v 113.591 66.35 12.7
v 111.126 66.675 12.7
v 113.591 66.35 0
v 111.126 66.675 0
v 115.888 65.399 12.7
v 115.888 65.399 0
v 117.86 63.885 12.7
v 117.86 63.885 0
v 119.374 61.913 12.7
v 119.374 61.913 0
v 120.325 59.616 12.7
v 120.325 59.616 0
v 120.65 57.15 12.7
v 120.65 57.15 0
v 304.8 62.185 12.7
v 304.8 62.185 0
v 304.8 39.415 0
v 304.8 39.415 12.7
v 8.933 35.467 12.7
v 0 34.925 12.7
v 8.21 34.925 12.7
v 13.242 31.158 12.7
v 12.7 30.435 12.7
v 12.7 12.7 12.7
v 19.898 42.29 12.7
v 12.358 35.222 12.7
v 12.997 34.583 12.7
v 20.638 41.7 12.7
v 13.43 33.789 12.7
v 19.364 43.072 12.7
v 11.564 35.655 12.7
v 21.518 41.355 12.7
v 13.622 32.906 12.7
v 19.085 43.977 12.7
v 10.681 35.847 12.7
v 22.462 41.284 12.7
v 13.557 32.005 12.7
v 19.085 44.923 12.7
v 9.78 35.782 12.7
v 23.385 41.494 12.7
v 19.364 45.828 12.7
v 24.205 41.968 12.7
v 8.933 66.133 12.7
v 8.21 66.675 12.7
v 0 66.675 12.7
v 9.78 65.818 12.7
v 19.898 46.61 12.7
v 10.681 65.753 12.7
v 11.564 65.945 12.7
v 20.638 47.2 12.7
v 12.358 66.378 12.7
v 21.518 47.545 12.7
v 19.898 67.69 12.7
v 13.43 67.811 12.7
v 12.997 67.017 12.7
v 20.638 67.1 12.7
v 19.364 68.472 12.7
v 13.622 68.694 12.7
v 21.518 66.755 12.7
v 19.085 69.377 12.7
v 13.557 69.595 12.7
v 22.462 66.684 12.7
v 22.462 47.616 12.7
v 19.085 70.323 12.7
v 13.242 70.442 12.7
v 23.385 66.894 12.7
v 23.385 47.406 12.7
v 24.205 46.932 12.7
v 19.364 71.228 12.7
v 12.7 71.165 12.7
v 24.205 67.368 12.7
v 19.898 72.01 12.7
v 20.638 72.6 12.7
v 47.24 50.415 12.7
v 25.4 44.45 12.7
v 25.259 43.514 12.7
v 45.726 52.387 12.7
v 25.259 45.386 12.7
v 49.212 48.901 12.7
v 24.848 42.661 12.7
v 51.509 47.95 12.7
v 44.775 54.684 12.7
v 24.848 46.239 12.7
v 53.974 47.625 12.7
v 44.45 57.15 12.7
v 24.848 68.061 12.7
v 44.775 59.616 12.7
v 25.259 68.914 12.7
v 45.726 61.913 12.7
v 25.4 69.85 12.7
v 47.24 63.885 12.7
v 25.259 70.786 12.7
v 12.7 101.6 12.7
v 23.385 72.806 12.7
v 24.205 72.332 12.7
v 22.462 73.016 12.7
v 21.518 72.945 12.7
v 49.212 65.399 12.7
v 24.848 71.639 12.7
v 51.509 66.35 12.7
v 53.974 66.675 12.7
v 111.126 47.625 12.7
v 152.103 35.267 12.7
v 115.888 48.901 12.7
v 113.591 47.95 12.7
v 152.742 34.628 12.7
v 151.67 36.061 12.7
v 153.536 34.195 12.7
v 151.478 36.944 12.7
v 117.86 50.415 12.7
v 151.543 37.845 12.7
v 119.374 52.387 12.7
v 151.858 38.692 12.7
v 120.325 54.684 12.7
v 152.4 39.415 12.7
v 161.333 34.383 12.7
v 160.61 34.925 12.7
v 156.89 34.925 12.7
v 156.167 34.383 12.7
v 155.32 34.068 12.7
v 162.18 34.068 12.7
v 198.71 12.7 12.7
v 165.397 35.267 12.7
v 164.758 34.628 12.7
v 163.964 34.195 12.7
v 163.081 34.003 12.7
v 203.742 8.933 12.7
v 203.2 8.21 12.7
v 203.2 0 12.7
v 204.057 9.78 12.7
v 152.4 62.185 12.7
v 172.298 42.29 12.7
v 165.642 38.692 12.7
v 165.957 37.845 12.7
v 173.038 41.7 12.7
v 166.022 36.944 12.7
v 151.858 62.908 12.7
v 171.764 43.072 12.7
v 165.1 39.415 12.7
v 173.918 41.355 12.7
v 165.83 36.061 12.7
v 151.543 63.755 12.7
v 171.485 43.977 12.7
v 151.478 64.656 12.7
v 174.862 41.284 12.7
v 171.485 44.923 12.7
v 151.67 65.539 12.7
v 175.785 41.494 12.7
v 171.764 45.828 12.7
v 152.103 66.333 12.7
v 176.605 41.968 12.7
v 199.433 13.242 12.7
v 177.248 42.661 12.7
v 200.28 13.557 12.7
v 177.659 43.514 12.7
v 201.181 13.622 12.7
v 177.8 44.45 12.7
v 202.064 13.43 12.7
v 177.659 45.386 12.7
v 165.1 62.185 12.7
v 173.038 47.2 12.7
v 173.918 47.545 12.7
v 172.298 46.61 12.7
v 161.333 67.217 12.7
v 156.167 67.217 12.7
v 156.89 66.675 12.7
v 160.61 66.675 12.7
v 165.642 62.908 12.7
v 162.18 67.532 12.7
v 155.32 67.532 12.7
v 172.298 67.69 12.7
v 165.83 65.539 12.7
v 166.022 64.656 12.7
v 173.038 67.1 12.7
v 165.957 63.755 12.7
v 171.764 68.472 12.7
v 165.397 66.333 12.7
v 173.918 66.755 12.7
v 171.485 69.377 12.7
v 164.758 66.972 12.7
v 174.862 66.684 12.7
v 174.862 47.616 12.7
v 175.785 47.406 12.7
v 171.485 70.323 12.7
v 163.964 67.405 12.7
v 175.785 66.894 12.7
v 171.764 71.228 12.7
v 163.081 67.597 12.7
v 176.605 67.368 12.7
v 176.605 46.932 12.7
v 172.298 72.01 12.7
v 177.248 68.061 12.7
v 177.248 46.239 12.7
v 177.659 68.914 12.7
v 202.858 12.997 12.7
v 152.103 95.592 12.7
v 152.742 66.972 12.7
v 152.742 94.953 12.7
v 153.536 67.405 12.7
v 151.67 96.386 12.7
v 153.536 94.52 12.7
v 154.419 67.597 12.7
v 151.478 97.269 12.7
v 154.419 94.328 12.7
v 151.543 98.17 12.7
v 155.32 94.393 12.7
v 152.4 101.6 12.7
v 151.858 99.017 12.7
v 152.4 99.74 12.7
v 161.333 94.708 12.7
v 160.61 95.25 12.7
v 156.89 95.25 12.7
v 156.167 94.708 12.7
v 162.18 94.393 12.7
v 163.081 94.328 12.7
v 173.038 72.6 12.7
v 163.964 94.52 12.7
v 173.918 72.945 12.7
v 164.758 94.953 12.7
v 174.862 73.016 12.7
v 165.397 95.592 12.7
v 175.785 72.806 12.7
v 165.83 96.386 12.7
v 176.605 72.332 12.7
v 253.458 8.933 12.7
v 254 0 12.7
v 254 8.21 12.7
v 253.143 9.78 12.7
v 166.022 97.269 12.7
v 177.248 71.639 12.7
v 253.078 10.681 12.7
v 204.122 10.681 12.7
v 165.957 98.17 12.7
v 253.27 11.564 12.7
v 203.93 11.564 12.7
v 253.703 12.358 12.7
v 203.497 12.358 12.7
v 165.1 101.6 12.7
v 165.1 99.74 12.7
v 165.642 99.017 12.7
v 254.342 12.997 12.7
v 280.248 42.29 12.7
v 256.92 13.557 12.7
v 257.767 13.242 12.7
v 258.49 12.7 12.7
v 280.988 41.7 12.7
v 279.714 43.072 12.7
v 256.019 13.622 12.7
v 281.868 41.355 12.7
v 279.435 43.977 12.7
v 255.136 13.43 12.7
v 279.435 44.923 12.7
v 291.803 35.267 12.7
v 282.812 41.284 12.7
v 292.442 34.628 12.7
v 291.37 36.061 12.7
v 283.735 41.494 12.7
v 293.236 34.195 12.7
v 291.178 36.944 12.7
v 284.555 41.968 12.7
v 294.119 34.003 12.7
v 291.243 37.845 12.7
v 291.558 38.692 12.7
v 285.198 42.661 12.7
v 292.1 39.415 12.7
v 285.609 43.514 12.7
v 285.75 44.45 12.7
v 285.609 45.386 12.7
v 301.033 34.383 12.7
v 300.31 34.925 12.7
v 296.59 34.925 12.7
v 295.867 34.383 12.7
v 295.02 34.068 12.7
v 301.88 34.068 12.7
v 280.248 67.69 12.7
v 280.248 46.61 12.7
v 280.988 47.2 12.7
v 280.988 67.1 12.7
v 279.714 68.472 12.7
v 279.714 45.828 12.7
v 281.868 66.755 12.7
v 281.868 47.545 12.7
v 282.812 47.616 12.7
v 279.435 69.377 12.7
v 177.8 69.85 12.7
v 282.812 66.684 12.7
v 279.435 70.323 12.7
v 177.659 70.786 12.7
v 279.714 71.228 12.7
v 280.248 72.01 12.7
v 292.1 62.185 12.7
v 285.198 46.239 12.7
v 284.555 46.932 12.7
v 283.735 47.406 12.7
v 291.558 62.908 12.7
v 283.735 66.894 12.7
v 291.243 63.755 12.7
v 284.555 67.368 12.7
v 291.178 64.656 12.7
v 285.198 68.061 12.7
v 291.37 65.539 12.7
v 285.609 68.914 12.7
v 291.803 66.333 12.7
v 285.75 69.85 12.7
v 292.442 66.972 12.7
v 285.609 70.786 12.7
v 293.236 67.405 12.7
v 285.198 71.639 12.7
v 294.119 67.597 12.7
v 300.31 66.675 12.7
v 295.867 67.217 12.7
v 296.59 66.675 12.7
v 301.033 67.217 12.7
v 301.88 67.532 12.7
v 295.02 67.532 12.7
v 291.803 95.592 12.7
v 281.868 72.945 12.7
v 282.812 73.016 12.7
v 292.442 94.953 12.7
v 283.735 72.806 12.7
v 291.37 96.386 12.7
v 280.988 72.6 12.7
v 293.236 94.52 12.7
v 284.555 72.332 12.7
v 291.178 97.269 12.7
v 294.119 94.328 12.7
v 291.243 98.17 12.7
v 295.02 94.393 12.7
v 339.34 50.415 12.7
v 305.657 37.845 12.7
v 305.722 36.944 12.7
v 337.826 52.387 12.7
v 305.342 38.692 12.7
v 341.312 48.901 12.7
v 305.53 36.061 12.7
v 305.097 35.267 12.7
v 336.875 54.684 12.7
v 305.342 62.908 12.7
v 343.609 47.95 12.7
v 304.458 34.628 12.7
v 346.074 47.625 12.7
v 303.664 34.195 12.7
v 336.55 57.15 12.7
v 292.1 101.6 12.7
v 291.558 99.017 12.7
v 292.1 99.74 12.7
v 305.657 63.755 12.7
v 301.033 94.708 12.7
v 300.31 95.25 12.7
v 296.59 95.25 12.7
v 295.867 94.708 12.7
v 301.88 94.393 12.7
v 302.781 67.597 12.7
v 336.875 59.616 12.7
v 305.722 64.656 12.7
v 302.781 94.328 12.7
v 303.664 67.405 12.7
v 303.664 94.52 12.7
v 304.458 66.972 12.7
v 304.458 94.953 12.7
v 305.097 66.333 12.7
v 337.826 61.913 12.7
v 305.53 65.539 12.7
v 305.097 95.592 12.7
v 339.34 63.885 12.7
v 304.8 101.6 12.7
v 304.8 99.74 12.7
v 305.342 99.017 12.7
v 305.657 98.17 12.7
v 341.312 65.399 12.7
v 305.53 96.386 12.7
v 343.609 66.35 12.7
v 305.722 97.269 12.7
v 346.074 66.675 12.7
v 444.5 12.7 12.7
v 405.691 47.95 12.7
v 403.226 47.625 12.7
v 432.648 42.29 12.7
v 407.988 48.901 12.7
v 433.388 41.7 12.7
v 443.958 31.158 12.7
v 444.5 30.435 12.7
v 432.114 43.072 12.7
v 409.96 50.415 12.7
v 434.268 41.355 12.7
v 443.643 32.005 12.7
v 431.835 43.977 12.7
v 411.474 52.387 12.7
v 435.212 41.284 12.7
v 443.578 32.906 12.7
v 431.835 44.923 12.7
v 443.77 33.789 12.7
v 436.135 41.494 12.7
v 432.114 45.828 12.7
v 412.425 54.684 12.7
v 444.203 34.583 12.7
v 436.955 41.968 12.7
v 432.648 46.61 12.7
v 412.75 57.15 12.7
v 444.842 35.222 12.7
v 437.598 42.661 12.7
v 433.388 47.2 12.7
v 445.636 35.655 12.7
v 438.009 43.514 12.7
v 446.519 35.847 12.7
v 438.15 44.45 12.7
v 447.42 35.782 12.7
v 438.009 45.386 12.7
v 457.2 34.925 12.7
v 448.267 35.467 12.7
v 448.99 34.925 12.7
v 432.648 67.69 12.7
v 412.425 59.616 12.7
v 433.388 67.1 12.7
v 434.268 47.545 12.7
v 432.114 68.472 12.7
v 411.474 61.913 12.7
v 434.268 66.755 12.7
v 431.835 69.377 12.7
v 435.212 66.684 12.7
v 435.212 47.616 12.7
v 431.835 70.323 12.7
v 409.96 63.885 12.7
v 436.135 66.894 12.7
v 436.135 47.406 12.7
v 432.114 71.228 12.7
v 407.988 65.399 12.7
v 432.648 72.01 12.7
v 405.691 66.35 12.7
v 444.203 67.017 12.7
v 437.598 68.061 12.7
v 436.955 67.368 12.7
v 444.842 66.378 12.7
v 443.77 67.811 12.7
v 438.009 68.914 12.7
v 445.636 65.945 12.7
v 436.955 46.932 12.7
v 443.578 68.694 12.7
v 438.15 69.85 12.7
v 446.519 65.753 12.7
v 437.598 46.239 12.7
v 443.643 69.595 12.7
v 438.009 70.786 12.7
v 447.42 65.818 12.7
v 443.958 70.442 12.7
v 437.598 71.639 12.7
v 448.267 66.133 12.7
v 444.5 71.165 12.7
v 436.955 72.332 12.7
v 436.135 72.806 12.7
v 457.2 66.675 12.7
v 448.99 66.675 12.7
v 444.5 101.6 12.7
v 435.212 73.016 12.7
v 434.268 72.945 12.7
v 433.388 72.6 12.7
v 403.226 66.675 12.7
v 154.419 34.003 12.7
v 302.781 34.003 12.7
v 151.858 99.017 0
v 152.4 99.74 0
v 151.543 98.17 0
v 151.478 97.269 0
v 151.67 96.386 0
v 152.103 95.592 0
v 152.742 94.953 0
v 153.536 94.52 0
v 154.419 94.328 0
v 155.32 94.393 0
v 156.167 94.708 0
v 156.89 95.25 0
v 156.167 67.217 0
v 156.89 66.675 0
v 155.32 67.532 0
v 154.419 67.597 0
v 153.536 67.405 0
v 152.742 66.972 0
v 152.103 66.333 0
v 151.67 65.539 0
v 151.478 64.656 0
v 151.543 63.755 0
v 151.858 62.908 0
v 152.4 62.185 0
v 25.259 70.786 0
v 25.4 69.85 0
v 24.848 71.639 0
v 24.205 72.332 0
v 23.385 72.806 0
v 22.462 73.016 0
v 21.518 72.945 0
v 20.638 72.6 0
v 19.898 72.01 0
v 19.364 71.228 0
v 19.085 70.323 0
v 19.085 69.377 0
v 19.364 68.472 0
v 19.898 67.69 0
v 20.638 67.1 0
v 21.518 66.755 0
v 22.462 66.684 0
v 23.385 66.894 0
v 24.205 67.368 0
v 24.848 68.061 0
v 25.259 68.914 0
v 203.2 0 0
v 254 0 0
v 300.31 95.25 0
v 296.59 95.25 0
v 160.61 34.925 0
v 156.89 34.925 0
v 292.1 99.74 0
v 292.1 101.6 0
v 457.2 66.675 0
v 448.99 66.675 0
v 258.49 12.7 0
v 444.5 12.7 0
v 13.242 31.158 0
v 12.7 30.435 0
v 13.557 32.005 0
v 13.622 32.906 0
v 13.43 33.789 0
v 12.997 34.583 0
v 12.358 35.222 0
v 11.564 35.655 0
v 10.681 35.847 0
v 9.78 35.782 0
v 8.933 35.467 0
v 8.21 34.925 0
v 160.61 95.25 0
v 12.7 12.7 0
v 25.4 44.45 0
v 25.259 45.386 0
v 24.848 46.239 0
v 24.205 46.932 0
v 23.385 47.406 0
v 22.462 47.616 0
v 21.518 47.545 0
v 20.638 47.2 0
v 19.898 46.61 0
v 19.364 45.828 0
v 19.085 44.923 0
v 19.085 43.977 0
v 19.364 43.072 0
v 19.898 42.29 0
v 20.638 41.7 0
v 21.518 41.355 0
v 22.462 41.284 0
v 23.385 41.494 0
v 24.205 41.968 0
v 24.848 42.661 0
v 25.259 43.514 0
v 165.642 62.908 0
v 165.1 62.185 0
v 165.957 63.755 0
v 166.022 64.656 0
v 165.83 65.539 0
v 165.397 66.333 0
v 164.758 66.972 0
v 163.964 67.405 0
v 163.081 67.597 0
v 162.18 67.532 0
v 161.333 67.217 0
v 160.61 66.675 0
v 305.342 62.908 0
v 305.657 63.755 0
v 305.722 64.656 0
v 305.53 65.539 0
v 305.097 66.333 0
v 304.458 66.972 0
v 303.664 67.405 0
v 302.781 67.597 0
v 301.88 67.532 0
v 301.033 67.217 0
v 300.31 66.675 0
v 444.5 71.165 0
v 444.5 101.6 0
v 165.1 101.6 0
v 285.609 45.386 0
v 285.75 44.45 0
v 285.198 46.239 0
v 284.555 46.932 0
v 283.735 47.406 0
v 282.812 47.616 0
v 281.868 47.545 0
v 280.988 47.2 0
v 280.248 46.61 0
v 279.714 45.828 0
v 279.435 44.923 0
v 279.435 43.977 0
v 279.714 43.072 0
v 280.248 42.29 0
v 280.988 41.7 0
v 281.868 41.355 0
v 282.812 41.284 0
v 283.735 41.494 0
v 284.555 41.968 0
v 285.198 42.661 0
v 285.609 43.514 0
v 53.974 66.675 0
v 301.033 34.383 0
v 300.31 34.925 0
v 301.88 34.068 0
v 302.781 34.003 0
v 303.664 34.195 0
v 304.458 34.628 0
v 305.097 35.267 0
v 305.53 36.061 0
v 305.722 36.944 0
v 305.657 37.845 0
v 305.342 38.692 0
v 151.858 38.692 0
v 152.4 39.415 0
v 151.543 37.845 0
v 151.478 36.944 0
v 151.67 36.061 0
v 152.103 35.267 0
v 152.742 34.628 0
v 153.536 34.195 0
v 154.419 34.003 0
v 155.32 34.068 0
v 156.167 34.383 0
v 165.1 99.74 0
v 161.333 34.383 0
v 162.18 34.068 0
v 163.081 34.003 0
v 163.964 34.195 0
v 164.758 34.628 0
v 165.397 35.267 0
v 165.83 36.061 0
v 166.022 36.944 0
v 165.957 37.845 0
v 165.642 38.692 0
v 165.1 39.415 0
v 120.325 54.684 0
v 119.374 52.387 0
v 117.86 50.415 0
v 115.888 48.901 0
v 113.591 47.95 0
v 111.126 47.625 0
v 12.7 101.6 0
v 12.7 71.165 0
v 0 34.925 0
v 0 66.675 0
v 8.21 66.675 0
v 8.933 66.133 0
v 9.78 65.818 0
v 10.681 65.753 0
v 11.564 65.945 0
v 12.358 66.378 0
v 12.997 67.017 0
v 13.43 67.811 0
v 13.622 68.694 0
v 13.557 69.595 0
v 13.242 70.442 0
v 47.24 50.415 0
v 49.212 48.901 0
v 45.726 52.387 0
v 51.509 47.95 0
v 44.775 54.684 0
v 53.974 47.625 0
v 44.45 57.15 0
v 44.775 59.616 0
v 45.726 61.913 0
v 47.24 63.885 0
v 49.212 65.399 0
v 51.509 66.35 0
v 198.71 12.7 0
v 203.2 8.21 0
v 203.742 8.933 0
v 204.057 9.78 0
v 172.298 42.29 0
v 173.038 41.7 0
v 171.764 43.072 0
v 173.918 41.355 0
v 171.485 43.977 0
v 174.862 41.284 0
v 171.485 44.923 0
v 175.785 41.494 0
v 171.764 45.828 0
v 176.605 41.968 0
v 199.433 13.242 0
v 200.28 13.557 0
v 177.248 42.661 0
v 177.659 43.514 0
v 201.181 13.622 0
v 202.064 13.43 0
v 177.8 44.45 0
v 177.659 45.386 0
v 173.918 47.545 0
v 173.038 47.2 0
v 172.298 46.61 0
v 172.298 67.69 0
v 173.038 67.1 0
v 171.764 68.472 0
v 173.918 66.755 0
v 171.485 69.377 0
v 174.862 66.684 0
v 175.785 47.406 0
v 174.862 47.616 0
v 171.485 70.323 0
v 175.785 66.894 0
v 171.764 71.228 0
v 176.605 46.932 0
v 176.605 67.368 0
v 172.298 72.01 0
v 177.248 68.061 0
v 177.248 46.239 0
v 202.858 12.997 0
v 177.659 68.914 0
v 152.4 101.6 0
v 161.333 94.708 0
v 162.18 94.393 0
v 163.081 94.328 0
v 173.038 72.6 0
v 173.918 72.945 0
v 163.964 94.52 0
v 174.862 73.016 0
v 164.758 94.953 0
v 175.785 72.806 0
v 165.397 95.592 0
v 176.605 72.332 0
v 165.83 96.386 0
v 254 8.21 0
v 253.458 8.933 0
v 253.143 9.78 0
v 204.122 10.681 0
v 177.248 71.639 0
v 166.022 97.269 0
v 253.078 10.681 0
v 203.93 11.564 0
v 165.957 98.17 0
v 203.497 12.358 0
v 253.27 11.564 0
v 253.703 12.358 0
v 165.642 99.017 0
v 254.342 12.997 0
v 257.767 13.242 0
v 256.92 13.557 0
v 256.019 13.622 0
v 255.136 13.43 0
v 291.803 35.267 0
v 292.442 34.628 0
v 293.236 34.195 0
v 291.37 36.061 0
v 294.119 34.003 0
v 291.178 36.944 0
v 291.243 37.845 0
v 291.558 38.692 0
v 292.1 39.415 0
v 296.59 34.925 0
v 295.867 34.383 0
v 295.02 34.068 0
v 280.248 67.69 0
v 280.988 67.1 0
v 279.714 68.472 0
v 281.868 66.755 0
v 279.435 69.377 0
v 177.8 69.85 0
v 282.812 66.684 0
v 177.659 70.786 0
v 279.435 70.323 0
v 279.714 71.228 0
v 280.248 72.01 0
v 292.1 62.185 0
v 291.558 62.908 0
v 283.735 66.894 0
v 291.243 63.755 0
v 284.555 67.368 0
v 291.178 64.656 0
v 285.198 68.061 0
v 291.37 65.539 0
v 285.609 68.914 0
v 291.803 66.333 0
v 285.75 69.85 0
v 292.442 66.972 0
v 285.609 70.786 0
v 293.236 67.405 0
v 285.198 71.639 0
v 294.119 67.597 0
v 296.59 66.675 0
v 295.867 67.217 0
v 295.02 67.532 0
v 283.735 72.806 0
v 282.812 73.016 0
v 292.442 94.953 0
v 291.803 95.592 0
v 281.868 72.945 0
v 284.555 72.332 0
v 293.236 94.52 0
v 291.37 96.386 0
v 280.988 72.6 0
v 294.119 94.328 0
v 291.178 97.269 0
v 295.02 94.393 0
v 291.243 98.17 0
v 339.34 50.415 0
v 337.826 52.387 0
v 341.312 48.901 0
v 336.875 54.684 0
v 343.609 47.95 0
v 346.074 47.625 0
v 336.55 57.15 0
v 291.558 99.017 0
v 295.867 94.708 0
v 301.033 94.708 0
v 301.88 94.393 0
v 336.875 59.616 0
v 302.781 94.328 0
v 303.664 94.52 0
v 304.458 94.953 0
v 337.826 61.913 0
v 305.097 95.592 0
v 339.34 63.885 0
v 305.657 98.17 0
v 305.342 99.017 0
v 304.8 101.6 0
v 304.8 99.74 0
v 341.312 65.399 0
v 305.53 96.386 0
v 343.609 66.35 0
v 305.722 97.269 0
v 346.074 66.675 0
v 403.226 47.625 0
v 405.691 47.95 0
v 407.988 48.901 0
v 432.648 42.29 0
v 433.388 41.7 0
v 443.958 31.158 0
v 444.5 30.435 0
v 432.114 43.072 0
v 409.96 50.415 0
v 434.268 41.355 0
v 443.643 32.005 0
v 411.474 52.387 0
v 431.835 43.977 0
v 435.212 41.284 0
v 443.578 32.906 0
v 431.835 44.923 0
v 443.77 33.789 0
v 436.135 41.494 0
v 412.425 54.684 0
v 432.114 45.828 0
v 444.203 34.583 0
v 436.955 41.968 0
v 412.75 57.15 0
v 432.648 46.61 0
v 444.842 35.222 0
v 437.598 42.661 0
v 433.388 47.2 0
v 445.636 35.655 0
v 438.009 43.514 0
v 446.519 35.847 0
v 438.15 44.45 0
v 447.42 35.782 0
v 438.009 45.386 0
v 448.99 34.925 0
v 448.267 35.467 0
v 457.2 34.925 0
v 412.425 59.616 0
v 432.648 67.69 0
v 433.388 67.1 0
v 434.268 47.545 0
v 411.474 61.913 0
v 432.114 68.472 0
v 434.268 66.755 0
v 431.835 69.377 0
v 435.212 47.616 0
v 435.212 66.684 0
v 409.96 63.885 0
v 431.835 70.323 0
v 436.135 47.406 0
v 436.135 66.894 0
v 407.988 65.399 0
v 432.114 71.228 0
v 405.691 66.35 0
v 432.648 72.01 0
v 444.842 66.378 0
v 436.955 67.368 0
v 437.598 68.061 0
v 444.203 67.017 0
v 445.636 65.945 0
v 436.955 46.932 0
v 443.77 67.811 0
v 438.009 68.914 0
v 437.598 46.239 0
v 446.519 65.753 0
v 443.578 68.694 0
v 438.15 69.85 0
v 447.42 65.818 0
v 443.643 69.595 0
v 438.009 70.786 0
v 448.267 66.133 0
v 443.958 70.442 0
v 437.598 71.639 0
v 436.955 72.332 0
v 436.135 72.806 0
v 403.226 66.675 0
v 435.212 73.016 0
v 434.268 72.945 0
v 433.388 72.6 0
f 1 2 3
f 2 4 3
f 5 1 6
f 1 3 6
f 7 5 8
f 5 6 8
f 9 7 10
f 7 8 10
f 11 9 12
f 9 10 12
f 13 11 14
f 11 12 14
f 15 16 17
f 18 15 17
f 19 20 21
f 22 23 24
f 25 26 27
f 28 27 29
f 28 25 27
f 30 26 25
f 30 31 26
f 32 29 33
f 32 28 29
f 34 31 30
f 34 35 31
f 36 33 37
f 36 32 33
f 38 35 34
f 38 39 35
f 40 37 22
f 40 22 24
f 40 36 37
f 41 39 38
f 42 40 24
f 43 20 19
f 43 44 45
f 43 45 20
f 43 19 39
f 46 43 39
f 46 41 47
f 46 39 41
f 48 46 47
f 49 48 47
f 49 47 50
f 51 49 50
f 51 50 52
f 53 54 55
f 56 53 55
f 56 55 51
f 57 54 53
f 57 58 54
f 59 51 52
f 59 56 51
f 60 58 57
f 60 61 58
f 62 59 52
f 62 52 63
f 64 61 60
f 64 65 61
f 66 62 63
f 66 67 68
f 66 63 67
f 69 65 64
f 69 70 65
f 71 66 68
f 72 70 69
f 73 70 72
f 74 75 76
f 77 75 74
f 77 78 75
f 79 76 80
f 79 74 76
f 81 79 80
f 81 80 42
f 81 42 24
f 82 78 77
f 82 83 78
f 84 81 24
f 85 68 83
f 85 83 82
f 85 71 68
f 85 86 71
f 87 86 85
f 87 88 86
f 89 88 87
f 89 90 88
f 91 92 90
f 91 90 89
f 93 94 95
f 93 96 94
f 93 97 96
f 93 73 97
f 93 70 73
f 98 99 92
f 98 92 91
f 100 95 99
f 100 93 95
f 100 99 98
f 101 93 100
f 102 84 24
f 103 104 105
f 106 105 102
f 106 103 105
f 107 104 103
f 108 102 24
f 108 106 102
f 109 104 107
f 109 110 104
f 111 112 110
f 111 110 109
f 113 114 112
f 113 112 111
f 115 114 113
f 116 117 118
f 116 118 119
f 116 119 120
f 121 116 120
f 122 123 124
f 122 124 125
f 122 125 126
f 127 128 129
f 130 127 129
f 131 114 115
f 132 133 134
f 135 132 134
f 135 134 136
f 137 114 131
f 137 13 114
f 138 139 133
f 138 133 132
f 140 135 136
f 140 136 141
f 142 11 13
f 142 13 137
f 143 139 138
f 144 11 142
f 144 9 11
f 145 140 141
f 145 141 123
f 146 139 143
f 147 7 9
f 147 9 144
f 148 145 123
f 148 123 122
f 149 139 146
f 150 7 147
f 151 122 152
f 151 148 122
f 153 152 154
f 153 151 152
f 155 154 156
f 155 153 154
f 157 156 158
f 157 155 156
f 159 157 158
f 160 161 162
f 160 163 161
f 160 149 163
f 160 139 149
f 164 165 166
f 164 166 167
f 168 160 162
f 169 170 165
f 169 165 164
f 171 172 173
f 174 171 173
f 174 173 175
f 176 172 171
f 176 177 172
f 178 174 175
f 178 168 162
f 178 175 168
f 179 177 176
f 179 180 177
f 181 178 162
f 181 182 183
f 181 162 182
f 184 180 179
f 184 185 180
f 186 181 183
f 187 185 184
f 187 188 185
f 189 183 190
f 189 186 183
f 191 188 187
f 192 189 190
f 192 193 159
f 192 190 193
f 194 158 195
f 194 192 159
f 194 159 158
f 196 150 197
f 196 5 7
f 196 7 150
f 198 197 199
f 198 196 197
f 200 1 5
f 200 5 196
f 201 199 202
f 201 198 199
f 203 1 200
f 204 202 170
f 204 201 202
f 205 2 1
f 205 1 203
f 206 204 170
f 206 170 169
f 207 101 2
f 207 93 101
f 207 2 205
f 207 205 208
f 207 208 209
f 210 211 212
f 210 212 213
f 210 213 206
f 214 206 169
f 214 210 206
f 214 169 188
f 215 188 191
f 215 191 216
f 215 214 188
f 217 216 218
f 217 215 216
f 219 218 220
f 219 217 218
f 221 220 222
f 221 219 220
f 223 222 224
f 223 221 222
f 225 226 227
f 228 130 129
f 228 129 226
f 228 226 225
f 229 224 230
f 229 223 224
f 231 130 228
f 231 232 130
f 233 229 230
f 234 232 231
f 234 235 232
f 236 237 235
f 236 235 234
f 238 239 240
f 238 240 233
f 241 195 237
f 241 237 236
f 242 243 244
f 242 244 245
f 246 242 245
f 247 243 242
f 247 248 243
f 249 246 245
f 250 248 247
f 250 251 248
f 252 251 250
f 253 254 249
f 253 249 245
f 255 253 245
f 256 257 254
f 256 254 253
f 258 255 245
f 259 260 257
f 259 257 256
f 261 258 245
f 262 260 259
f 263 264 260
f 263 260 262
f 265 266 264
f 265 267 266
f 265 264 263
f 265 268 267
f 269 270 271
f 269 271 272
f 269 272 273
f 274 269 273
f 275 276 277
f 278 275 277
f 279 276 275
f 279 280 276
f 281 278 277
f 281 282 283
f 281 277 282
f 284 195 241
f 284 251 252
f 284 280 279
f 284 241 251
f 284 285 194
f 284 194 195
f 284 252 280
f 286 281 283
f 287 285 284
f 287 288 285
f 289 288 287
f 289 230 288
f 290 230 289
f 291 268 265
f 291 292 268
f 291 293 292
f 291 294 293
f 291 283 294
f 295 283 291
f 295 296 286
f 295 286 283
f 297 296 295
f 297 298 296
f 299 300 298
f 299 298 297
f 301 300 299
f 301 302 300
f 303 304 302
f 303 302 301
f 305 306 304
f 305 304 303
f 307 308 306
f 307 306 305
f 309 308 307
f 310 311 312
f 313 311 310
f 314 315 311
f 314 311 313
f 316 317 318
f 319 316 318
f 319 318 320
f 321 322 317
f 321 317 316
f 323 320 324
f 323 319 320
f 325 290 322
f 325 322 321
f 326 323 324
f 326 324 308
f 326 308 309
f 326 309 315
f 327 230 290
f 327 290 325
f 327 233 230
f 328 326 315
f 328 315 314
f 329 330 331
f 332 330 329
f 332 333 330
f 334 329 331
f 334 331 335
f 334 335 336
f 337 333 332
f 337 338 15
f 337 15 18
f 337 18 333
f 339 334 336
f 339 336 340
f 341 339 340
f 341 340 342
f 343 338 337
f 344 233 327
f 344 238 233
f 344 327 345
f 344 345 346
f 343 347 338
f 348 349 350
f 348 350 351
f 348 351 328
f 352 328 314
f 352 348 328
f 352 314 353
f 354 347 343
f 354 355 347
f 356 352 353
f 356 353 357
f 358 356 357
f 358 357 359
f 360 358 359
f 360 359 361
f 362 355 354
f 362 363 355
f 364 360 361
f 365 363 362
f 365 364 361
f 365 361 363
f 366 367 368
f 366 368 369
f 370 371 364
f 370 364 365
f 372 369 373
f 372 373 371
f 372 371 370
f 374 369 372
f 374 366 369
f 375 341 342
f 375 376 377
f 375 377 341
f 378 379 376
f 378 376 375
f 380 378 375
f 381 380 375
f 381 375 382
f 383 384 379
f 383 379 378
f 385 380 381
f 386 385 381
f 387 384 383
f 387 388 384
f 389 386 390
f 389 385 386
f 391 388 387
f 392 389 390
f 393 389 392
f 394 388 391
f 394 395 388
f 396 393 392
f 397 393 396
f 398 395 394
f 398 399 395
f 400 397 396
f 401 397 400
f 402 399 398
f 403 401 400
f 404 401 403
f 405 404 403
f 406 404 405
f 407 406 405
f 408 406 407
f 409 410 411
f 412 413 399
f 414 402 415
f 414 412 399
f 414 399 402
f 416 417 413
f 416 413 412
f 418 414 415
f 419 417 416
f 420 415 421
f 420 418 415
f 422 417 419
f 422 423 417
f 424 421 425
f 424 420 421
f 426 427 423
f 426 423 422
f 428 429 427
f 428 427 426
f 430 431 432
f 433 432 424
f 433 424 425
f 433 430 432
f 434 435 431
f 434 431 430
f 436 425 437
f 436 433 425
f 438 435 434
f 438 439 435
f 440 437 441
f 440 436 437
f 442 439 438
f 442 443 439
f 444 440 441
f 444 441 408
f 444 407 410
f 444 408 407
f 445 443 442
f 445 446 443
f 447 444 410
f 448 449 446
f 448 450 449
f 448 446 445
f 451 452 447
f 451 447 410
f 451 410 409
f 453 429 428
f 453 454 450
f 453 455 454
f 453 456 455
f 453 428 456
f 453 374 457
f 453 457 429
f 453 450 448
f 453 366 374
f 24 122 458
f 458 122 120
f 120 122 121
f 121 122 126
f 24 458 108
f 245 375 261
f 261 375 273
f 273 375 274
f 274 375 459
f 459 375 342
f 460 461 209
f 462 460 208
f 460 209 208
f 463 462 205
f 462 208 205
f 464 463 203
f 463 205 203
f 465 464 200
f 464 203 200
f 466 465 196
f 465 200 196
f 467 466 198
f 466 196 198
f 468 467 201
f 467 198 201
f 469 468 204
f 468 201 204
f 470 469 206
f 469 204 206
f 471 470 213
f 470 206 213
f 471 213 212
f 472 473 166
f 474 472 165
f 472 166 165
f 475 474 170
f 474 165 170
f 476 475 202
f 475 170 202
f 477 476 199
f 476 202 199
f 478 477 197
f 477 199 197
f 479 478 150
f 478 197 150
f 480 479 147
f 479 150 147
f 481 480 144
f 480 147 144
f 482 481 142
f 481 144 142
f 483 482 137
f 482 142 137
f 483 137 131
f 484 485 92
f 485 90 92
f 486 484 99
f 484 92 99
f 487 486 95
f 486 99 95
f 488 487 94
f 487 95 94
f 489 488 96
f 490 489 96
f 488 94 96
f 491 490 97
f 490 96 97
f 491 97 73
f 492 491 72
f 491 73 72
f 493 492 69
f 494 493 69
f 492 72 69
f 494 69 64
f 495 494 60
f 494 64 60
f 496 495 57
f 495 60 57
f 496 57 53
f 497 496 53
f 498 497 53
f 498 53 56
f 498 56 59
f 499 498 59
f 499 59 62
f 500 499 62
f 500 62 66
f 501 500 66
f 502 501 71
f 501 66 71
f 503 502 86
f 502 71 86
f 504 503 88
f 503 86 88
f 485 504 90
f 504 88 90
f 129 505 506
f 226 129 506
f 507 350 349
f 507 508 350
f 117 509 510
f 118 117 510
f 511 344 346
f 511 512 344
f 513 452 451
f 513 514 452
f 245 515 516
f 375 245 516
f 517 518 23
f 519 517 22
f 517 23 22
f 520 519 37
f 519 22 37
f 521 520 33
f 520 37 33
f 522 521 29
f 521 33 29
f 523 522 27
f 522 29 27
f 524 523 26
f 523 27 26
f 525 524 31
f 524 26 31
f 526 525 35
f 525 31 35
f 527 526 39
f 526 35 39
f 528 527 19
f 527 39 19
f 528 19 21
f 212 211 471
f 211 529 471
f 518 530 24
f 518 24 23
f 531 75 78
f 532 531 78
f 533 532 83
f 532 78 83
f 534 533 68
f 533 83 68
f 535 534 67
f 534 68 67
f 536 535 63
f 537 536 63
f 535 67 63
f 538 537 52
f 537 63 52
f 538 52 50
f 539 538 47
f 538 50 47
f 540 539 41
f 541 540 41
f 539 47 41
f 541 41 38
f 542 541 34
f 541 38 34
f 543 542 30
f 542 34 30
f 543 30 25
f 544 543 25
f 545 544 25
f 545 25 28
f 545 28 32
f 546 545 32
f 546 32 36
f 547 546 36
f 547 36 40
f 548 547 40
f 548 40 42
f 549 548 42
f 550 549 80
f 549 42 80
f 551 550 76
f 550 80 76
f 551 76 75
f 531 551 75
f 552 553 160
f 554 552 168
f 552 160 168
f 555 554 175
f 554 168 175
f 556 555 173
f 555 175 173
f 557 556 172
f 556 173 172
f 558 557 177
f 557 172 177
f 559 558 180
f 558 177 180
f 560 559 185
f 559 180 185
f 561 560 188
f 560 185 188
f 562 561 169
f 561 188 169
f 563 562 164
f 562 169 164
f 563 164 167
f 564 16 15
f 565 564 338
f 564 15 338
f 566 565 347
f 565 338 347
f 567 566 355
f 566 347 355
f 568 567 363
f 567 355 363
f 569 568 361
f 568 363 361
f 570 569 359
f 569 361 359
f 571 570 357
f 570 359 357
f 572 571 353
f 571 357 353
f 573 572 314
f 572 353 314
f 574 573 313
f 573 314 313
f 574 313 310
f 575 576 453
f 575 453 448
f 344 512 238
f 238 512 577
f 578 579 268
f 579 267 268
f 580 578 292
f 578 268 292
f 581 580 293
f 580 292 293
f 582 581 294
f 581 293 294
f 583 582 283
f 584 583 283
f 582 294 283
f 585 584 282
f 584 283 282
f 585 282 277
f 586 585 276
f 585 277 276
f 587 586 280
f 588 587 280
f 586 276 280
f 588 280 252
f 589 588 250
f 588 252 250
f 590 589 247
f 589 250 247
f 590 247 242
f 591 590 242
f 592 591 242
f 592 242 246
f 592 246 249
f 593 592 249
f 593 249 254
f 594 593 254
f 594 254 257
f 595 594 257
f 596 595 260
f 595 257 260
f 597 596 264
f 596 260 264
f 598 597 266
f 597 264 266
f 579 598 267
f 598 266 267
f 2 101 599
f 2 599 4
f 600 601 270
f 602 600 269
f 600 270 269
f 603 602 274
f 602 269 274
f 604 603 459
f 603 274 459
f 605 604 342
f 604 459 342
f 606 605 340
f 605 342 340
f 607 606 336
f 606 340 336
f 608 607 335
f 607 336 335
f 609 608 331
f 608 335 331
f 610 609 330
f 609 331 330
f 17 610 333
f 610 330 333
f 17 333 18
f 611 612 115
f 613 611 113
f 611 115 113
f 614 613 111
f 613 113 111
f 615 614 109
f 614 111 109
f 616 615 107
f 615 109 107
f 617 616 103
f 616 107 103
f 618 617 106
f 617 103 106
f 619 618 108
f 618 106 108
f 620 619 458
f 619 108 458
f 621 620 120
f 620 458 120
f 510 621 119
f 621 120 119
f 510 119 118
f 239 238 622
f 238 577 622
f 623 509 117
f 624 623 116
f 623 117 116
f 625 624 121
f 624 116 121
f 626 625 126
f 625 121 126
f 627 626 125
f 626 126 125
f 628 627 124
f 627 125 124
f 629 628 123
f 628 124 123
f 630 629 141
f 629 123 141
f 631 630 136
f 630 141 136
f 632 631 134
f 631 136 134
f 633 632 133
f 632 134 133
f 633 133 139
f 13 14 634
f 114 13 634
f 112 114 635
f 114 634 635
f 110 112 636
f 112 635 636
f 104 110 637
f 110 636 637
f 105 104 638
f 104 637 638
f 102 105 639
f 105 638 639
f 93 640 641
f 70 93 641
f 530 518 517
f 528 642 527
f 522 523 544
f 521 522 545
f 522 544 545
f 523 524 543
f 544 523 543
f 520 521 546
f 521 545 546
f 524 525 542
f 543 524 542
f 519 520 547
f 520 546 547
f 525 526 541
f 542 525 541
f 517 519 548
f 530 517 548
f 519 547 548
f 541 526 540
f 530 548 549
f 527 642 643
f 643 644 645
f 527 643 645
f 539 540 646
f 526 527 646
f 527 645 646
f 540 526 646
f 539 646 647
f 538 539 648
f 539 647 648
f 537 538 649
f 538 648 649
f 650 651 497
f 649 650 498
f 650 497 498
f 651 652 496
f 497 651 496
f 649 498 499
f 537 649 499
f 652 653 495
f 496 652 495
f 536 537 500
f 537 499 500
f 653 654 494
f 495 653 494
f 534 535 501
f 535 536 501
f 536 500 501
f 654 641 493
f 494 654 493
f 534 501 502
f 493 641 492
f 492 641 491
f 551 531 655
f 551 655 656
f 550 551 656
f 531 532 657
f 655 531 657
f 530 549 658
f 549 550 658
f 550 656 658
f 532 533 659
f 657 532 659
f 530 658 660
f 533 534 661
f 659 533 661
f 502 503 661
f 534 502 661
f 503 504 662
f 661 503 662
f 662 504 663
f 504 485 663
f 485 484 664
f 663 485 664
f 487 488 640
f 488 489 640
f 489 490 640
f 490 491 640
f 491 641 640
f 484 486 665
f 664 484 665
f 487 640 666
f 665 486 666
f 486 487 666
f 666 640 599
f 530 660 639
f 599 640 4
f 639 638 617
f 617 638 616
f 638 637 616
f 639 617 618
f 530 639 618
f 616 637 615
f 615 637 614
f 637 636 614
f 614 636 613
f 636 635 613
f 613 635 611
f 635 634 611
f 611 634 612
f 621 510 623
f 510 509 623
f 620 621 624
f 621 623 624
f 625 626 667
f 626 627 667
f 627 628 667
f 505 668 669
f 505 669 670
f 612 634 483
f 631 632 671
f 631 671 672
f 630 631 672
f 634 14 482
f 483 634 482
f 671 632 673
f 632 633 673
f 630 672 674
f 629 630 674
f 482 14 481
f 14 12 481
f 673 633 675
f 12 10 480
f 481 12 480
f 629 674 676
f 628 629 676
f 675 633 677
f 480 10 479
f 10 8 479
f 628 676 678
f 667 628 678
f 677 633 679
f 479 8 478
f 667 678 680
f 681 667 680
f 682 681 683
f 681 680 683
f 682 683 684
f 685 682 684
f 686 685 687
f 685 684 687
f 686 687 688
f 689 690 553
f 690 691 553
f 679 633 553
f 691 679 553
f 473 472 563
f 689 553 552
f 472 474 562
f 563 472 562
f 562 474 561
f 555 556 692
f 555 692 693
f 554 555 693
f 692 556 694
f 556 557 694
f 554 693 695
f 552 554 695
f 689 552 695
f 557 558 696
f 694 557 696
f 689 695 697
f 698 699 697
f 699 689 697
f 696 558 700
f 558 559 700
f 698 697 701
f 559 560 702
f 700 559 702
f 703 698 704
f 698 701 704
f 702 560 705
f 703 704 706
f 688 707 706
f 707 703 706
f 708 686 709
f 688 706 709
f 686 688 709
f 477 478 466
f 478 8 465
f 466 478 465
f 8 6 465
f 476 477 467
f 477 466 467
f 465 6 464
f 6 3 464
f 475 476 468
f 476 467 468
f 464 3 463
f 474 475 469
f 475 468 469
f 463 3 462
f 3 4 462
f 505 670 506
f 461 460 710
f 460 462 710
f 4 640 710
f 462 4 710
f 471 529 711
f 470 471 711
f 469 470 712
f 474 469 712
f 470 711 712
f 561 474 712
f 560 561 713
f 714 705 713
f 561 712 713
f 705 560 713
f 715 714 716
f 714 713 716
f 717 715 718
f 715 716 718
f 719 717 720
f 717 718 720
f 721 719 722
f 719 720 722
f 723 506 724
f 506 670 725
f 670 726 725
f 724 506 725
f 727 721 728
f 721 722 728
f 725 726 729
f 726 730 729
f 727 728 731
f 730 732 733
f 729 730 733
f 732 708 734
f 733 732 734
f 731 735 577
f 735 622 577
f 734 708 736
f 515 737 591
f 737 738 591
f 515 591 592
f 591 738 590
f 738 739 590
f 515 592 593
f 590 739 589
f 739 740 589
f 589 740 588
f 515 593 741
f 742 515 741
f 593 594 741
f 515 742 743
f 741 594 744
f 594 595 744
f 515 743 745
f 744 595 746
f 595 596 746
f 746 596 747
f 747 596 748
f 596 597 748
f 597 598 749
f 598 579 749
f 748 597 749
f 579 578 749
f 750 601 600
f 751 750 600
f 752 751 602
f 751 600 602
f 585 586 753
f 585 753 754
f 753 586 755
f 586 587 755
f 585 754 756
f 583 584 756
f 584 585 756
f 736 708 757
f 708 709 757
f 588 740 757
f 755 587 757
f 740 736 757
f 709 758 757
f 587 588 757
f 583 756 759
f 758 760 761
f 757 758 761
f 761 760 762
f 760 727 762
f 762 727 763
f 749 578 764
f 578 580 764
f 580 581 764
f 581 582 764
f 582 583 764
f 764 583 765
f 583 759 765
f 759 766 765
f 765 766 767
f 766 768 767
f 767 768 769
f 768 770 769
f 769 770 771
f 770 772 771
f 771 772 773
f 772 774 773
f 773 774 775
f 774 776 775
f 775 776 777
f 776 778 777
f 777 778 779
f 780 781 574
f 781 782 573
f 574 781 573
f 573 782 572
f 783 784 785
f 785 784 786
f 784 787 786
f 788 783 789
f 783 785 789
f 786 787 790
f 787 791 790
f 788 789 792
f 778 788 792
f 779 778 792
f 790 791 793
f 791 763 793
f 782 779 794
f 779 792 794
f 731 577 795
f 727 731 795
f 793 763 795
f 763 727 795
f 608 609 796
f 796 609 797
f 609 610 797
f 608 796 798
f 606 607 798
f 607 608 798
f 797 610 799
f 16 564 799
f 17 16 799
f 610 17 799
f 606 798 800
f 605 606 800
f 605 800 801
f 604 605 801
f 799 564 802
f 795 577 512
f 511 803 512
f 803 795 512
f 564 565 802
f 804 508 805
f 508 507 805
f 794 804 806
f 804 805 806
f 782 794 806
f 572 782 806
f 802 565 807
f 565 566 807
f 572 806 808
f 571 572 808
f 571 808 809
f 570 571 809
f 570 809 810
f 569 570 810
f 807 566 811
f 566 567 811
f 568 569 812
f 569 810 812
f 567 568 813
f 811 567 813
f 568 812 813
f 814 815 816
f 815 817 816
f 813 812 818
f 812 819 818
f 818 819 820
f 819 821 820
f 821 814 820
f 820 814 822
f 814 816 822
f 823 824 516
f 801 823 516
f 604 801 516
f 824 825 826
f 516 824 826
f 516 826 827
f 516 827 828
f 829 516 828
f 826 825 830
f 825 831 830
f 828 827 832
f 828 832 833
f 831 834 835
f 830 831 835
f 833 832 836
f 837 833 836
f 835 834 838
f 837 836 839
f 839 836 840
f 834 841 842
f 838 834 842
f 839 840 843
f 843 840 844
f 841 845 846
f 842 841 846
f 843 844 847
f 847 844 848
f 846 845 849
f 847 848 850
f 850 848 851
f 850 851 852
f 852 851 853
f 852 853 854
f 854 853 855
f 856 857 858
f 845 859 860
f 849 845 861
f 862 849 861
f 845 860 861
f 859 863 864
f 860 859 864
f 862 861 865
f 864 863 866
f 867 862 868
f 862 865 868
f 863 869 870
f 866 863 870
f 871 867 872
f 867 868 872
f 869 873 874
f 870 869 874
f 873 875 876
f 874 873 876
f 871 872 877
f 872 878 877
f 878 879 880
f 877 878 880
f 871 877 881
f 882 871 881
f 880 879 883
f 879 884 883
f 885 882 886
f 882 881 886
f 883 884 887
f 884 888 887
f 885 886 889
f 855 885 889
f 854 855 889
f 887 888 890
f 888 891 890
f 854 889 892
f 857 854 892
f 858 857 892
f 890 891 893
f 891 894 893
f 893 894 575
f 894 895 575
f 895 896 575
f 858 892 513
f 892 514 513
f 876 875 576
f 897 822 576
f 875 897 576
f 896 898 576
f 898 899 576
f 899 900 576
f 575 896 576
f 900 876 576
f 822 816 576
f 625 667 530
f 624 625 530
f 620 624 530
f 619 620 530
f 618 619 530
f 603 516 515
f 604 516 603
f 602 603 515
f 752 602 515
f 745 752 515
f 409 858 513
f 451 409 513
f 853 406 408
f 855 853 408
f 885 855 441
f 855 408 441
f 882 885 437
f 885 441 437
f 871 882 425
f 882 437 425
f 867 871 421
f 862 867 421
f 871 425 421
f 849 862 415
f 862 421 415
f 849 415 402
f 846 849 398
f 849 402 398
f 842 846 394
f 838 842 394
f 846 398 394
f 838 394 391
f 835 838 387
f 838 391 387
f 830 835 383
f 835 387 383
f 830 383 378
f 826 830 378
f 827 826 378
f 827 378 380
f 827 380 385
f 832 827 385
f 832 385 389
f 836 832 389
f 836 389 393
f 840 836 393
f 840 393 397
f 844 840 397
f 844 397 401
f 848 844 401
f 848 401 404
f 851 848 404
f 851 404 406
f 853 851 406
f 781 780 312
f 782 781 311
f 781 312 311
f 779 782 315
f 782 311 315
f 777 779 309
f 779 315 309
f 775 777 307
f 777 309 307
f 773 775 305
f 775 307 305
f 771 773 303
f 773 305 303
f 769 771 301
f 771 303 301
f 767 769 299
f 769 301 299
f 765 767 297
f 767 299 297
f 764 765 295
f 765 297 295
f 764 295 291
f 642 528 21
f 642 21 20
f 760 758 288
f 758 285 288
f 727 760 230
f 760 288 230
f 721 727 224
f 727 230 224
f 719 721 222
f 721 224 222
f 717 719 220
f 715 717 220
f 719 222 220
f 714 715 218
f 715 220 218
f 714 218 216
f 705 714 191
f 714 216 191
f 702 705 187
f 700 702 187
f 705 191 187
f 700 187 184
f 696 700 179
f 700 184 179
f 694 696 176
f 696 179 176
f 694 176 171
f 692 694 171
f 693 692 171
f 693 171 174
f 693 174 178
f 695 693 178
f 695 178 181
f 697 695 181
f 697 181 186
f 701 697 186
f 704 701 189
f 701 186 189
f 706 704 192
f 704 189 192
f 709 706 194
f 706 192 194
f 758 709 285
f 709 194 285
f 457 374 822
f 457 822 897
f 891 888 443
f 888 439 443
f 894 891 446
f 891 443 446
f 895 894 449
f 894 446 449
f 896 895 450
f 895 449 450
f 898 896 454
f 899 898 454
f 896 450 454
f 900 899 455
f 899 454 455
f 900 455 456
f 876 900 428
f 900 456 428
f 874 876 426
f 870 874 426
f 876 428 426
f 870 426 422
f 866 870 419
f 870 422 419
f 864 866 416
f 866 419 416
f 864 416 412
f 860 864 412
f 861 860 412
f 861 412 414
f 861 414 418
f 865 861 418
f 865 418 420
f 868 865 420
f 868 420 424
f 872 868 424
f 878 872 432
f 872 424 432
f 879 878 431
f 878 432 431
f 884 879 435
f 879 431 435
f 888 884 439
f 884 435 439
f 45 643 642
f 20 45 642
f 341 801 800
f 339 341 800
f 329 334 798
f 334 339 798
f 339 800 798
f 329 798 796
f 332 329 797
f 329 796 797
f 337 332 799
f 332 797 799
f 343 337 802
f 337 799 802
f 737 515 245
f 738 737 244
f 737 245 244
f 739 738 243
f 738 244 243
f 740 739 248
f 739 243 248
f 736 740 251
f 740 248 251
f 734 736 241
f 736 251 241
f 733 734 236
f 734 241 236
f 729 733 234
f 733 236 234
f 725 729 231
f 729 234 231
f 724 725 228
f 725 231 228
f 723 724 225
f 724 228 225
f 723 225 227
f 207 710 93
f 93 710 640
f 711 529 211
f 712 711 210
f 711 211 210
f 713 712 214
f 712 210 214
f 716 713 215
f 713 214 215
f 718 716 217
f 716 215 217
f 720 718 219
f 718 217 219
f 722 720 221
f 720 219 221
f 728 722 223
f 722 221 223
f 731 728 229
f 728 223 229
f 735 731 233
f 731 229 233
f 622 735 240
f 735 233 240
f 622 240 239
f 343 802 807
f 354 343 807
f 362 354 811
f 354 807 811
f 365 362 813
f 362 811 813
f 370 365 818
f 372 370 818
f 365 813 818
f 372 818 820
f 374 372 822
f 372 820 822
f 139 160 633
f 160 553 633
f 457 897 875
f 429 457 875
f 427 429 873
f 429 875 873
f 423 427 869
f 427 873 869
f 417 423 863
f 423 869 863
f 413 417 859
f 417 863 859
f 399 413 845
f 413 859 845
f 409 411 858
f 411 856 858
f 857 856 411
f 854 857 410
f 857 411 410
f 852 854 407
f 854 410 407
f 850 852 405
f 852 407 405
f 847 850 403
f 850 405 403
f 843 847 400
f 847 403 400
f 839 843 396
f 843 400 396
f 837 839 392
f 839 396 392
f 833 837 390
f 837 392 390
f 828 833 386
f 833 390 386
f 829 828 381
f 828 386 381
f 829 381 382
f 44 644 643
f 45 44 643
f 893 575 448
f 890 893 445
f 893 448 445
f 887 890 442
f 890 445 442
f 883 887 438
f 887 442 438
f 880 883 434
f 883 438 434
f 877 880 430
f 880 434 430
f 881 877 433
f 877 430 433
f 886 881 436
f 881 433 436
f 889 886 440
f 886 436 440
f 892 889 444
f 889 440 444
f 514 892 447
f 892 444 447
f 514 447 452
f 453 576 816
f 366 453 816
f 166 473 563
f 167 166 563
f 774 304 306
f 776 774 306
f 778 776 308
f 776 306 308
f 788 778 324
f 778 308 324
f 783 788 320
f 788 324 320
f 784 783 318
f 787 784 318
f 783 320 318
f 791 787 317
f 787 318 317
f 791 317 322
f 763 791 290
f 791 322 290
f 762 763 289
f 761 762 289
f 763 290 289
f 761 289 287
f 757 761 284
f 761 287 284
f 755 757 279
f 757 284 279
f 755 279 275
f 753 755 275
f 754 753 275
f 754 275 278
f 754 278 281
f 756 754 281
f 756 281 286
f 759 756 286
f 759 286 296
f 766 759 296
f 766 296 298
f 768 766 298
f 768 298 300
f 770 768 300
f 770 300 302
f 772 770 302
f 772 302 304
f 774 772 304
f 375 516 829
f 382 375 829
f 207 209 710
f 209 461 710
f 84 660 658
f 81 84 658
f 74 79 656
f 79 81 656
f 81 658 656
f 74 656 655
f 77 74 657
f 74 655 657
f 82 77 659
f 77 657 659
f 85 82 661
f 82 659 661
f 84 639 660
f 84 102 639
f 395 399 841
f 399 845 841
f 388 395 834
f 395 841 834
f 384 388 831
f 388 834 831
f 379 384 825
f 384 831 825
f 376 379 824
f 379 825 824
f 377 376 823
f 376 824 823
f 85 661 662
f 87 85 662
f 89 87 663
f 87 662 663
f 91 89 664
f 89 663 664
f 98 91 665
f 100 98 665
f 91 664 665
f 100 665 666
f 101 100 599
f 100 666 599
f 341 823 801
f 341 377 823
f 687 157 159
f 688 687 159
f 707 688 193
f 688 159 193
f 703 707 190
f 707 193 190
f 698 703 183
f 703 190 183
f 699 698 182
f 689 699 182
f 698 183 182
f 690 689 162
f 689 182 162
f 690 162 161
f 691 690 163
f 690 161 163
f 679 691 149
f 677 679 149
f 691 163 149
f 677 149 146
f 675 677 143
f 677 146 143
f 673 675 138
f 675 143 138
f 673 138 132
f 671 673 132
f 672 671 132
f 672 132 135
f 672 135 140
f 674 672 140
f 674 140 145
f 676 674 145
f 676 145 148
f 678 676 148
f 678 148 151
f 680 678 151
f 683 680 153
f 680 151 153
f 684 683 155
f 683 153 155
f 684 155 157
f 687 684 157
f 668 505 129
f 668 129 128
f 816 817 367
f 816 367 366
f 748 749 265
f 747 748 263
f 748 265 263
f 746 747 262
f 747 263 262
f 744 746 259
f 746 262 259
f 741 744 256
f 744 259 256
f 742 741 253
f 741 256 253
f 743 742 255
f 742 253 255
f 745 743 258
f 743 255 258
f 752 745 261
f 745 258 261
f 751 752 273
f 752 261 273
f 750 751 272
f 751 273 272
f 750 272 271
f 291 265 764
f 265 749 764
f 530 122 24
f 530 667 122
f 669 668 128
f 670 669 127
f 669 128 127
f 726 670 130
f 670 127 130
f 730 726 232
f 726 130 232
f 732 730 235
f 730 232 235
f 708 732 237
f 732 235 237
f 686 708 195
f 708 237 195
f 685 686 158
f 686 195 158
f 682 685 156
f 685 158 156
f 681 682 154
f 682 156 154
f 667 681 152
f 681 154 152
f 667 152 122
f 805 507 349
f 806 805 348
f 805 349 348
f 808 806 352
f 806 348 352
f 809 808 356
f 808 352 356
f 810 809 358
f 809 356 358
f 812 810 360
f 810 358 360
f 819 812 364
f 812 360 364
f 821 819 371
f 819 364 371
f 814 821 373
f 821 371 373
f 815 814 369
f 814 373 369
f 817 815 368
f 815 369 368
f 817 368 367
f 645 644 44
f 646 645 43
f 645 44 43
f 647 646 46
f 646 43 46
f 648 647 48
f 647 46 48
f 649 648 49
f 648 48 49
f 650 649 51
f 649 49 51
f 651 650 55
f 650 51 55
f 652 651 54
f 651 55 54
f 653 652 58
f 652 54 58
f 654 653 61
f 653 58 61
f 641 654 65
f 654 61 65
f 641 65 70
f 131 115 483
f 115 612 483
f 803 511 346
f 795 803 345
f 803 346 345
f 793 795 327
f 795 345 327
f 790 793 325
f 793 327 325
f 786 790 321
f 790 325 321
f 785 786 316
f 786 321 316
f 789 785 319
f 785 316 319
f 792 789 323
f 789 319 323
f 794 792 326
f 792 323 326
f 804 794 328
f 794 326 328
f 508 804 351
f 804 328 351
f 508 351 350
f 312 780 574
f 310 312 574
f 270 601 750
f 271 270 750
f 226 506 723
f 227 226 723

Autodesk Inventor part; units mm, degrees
ref_plane "YZ Plane" through (0, 0, 0) normal (1, 0, 0) x (0, 1, 0)
ref_plane "XZ Plane" through (0, 0, 0) normal (0, 1, 0) x (-1, 0, 0)
ref_plane "XY Plane" through (0, 0, 0) normal (0, 0, 1) x (1, 0, 0)
sketch "Sketch1" plane through (0, 0, 0) normal (0, 0, 1) x (1, 0, 0)
  line L0 (0, 0) -> (457.2, 0)
  line L1 (457.2, 0) -> (457.2, 101.6)
  line L2 (457.2, 101.6) -> (0, 101.6)
  line L3 (0, 101.6) -> (0, 0)
  line L4 (0, 101.6) -> (12.7, 101.6)
  line L5 (12.7, 101.6) -> (12.7, 66.675)
  line L6 (12.7, 66.675) -> (0, 66.675)
  line L7 (0, 66.675) -> (0, 101.6)
  line L8 (457.2, 101.6) -> (444.5, 101.6)
  line L9 (444.5, 101.6) -> (444.5, 66.675)
  line L10 (444.5, 66.675) -> (457.2, 66.675)
  line L11 (457.2, 66.675) -> (457.2, 101.6)
  line L12 (0, 0) -> (12.7, 0)
  line L13 (12.7, 0) -> (12.7, 34.925)
  line L14 (12.7, 34.925) -> (0, 34.925)
  line L15 (0, 34.925) -> (0, 0)
  line L16 (457.2, 0) -> (444.5, 0)
  line L17 (444.5, 0) -> (444.5, 34.925)
  line L18 (444.5, 34.925) -> (457.2, 34.925)
  line L19 (457.2, 34.925) -> (457.2, 0)
  line L20 (152.4, 101.6) -> (165.1, 101.6)
  line L21 (165.1, 101.6) -> (165.1, 95.25)
  line L22 (165.1, 95.25) -> (152.4, 95.25)
  line L23 (152.4, 95.25) -> (152.4, 101.6)
  line L24 (304.8, 101.6) -> (292.1, 101.6)
  line L25 (292.1, 101.6) -> (292.1, 95.25)
  line L26 (292.1, 95.25) -> (304.8, 95.25)
  line L27 (304.8, 95.25) -> (304.8, 101.6)
  line L28 (152.4, 66.675) -> (165.1, 66.675)
  line L29 (165.1, 66.675) -> (165.1, 34.925)
  line L30 (165.1, 34.925) -> (152.4, 34.925)
  line L31 (152.4, 34.925) -> (152.4, 66.675)
  line L32 (292.1, 66.675) -> (304.8, 66.675)
  line L33 (304.8, 66.675) -> (304.8, 34.925)
  line L34 (304.8, 34.925) -> (292.1, 34.925)
  line L35 (292.1, 34.925) -> (292.1, 66.675)
  line L36 (12.7, 0) -> (203.2, 0)
  line L37 (203.2, 0) -> (203.2, 12.7)
  line L38 (203.2, 12.7) -> (12.7, 12.7)
  line L39 (12.7, 12.7) -> (12.7, 0)
  line L40 (444.5, 0) -> (254, 0)
  line L41 (254, 0) -> (254, 12.7)
  line L42 (254, 12.7) -> (444.5, 12.7)
  line L43 (444.5, 12.7) -> (444.5, 0)
  point P0 (0, 66.675)
  point P1 (12.7, 12.7)
  point P2 (292.1, 101.6)
  point P3 (165.1, 101.6)
  dimension "d0" = 101.6
  dimension "d1" = 457.2
  dimension "d2" = 12.7
  dimension "d3" = 34.925
  dimension "d4" = 12.7
  dimension "d5" = 34.925
  dimension "d6" = 12.7
  dimension "d7" = 34.925
  dimension "d8" = 12.7
  dimension "d9" = 34.925
  dimension "d13" = 12.7
  dimension "d14" = 6.35
  dimension "d15" = 139.7
  dimension "d16" = 12.7
  dimension "d17" = 6.35
  dimension "d18" = 139.7
  dimension "d19" = 12.7
  dimension "d20" = 139.7
  dimension "d21" = 28.575
  dimension "d22" = 12.7
  dimension "d23" = 139.7
  dimension "d24" = 28.575
  dimension "d25" = 31.75
  dimension "d26" = 31.75
  dimension "d27" = 190.5
  dimension "d28" = 12.7
  dimension "d29" = 190.5
  dimension "d30" = 12.7
extrude "Extrusion1" add sketch "Sketch1" along normal blind 12.7 contours L3 L6 L5 L2 L23 L22 L21 L25 L26 L27 L9 L10 L1 L18 L17 L42 L41 L0 L37 L38 L13 L14
sketch "Sketch3" plane through (0, 0, 12.7) normal (0, 0, 1) x (1, 0, 0)
  line L0 (12.7, 101.6) -> (12.7, 66.675) projected
  line L1 (12.7, 66.675) -> (10.4549, 68.9201)
  circle A0 centre (10.4549, 68.9201) radius 3.175
  line L2 (12.7, 34.925) -> (12.7, 12.7) projected
  line L3 (12.7, 34.925) -> (10.4549, 32.6799)
  circle A1 centre (10.4549, 32.6799) radius 3.175
  line L4 (203.2, 12.7) -> (203.2, 0) projected
  line L5 (203.2, 12.7) -> (200.9549, 10.4549)
  circle A2 centre (200.9549, 10.4549) radius 3.175
  line L6 (254, 0) -> (254, 12.7) projected
  line L7 (254, 12.7) -> (256.2451, 10.4549)
  line L8 (254, 12.7) -> (444.5, 12.7) projected
  circle A3 centre (256.2451, 10.4549) radius 3.175
  line L9 (444.5, 34.925) -> (446.7451, 32.6799)
  line L10 (444.5, 34.925) -> (457.2, 34.925) projected
  circle A4 centre (446.7451, 32.6799) radius 3.175
  line L11 (457.2, 66.675) -> (444.5, 66.675) projected
  line L12 (444.5, 66.675) -> (446.7451, 68.9201)
  circle A5 centre (446.7451, 68.9201) radius 3.175
  line L13 (304.8, 34.925) -> (292.1, 34.925) projected
  line L14 (292.1, 34.925) -> (294.3451, 37.1701)
  line L15 (304.8, 34.925) -> (302.5549, 37.1701)
  line L16 (304.8, 66.675) -> (304.8, 34.925) projected
  line L17 (292.1, 66.675) -> (304.8, 66.675) projected
  line L18 (292.1, 66.675) -> (294.3451, 64.4299)
  line L19 (304.8, 66.675) -> (302.5549, 64.4299)
  line L20 (304.8, 95.25) -> (292.1, 95.25) projected
  line L21 (292.1, 95.25) -> (294.3451, 97.4951)
  line L22 (304.8, 95.25) -> (302.5549, 97.4951)
  line L23 (304.8, 101.6) -> (304.8, 95.25) projected
  line L24 (165.1, 34.925) -> (152.4, 34.925) projected
  line L25 (152.4, 34.925) -> (154.6451, 37.1701)
  line L26 (165.1, 66.675) -> (165.1, 34.925) projected
  line L27 (165.1, 34.925) -> (162.8549, 37.1701)
  line L28 (152.4, 66.675) -> (165.1, 66.675) projected
  line L29 (152.4, 66.675) -> (154.6451, 64.4299)
  line L30 (165.1, 66.675) -> (162.8549, 64.4299)
  line L31 (165.1, 95.25) -> (152.4, 95.25) projected
  line L32 (152.4, 95.25) -> (154.6451, 97.4951)
  line L33 (165.1, 95.25) -> (162.8549, 97.4951)
  line L34 (165.1, 101.6) -> (165.1, 95.25) projected
  circle A6 centre (154.6451, 97.4951) radius 3.175
  circle A7 centre (162.8549, 97.4951) radius 3.175
  circle A8 centre (154.6451, 64.4299) radius 3.175
  circle A9 centre (162.8549, 64.4299) radius 3.175
  circle A10 centre (162.8549, 37.1701) radius 3.175
  circle A11 centre (154.6451, 37.1701) radius 3.175
  circle A12 centre (294.3451, 37.1701) radius 3.175
  circle A13 centre (302.5549, 37.1701) radius 3.175
  circle A14 centre (294.3451, 64.4299) radius 3.175
  circle A15 centre (302.5549, 64.4299) radius 3.175
  circle A16 centre (294.3451, 97.4951) radius 3.175
  circle A17 centre (302.5549, 97.4951) radius 3.175
  point P0 (0, 0)
  dimension "d38" = 3.175
  dimension "d39" = 45
  dimension "d40" = 6.35
  dimension "d41" = 3.175
  dimension "d42" = 45
  dimension "d43" = 6.35
  dimension "d44" = 3.175
  dimension "d45" = 45
  dimension "d46" = 6.35
  dimension "d47" = 3.175
  dimension "d48" = 45
  dimension "d49" = 6.35
  dimension "d50" = 3.175
  dimension "d51" = 45
  dimension "d52" = 6.35
  dimension "d53" = 3.175
  dimension "d54" = 45
  dimension "d55" = 6.35
  dimension "d56" = 3.175
  dimension "d57" = 45
  dimension "d58" = 3.175
  dimension "d59" = 45
  dimension "d60" = 3.175
  dimension "d61" = 45
  dimension "d62" = 3.175
  dimension "d63" = 45
  dimension "d64" = 3.175
  dimension "d65" = 45
  dimension "d66" = 3.175
  dimension "d67" = 45
  dimension "d68" = 3.175
  dimension "d69" = 45
  dimension "d70" = 3.175
  dimension "d71" = 45
  dimension "d72" = 3.175
  dimension "d73" = 45
  dimension "d74" = 3.175
  dimension "d75" = 45
  dimension "d76" = 3.175
  dimension "d77" = 45
  dimension "d78" = 3.175
  dimension "d79" = 45
  dimension "d80" = 6.35
  dimension "d81" = 6.35
  dimension "d82" = 6.35
  dimension "d83" = 6.35
  dimension "d84" = 6.35
  dimension "d85" = 6.35
  dimension "d86" = 6.35
  dimension "d87" = 6.35
  dimension "d88" = 6.35
  dimension "d89" = 6.35
  dimension "d90" = 6.35
  dimension "d91" = 6.35
extrude "Extrusion3" cut sketch "Sketch3" against normal blind 25.4
sketch "Sketch6" plane through (0, 0, 12.7) normal (0, 0, 1) x (1, 0, 0)
  circle A0 centre (22.225, 69.85) radius 3.175
  line L0 (152.4, 101.6) -> (12.7, 101.6) projected
  line L1 (12.7, 101.6) -> (12.7, 71.1651) projected
  circle A1 centre (174.625, 69.85) radius 3.175
  line L2 (292.1, 101.6) -> (165.1, 101.6) projected
  line L3 (165.1, 62.1849) -> (165.1, 39.4151) projected
  circle A2 centre (282.575, 69.85) radius 3.175
  line L4 (292.1, 39.4151) -> (292.1, 62.1849) projected
  circle A3 centre (282.575, 44.45) radius 3.175
  circle A4 centre (174.625, 44.45) radius 3.175
  circle A5 centre (22.225, 44.45) radius 3.175
  circle A6 centre (434.975, 69.85) radius 3.175
  line L5 (444.5, 101.6) -> (304.8, 101.6) projected
  line L6 (444.5, 71.1651) -> (444.5, 101.6) projected
  circle A7 centre (434.975, 44.45) radius 3.175
  line L7 (444.5, 12.7) -> (444.5, 30.4349) projected
  point P0 (0, 0)
  dimension "d146" = 6.35
  dimension "d147" = 31.75
  dimension "d148" = 9.525
  dimension "d149" = 6.35
  dimension "d150" = 31.75
  dimension "d151" = 9.525
  dimension "d152" = 6.35
  dimension "d153" = 31.75
  dimension "d154" = 9.525
  dimension "d155" = 6.35
  dimension "d156" = 9.525
  dimension "d157" = 25.4
  dimension "d158" = 6.35
  dimension "d159" = 9.525
  dimension "d160" = 25.4
  dimension "d161" = 6.35
  dimension "d162" = 9.525
  dimension "d163" = 25.4
  dimension "d164" = 6.35
  dimension "d165" = 31.75
  dimension "d166" = 9.525
  dimension "d167" = 6.35
  dimension "d168" = 9.525
  dimension "d169" = 25.4
extrude "Extrusion5" cut sketch "Sketch6" against normal blind 12.7
sketch "Sketch7" plane through (0, 0, 12.7) normal (0, 0, 1) x (1, 0, 0)
  line L0 (44.45, 66.675) -> (120.65, 66.675)
  line L1 (120.65, 66.675) -> (120.65, 47.625)
  line L2 (120.65, 47.625) -> (44.45, 47.625)
  line L3 (44.45, 47.625) -> (44.45, 66.675)
  line L4 (12.7, 101.6) -> (12.7, 71.1651) projected
  line L5 (152.4, 101.6) -> (12.7, 101.6) projected
  line L6 (336.55, 66.675) -> (412.75, 66.675)
  line L7 (412.75, 66.675) -> (412.75, 47.625)
  line L8 (412.75, 47.625) -> (336.55, 47.625)
  line L9 (336.55, 47.625) -> (336.55, 66.675)
  line L10 (444.5, 101.6) -> (304.8, 101.6) projected
  line L11 (444.5, 12.7) -> (444.5, 30.4349) projected
  point P0 (0, 0)
  point P1 (82.55, 66.675)
  point P2 (44.45, 57.15)
  point P3 (412.75, 57.15)
  point P4 (374.65, 66.675)
  dimension "d172" = 19.05
  dimension "d173" = 76.2
  dimension "d174" = 69.85
  dimension "d175" = 44.45
  dimension "d176" = 76.2
  dimension "d177" = 19.05
  dimension "d178" = 44.45
  dimension "d179" = 69.85
extrude "Extrusion6" cut sketch "Sketch7" against normal blind 12.7
fillet "Fillet1" radius 9.525 8 edges at (44.45, 47.625, 6.35) (44.45, 66.675, 6.35) (120.65, 66.675, 6.35) (120.65, 47.625, 6.35) (336.55, 66.675, 6.35) (336.55, 47.625, 6.35) (412.75, 47.625, 6.35) (412.75, 66.675, 6.35)
properties part number "Inner Front Wall"
